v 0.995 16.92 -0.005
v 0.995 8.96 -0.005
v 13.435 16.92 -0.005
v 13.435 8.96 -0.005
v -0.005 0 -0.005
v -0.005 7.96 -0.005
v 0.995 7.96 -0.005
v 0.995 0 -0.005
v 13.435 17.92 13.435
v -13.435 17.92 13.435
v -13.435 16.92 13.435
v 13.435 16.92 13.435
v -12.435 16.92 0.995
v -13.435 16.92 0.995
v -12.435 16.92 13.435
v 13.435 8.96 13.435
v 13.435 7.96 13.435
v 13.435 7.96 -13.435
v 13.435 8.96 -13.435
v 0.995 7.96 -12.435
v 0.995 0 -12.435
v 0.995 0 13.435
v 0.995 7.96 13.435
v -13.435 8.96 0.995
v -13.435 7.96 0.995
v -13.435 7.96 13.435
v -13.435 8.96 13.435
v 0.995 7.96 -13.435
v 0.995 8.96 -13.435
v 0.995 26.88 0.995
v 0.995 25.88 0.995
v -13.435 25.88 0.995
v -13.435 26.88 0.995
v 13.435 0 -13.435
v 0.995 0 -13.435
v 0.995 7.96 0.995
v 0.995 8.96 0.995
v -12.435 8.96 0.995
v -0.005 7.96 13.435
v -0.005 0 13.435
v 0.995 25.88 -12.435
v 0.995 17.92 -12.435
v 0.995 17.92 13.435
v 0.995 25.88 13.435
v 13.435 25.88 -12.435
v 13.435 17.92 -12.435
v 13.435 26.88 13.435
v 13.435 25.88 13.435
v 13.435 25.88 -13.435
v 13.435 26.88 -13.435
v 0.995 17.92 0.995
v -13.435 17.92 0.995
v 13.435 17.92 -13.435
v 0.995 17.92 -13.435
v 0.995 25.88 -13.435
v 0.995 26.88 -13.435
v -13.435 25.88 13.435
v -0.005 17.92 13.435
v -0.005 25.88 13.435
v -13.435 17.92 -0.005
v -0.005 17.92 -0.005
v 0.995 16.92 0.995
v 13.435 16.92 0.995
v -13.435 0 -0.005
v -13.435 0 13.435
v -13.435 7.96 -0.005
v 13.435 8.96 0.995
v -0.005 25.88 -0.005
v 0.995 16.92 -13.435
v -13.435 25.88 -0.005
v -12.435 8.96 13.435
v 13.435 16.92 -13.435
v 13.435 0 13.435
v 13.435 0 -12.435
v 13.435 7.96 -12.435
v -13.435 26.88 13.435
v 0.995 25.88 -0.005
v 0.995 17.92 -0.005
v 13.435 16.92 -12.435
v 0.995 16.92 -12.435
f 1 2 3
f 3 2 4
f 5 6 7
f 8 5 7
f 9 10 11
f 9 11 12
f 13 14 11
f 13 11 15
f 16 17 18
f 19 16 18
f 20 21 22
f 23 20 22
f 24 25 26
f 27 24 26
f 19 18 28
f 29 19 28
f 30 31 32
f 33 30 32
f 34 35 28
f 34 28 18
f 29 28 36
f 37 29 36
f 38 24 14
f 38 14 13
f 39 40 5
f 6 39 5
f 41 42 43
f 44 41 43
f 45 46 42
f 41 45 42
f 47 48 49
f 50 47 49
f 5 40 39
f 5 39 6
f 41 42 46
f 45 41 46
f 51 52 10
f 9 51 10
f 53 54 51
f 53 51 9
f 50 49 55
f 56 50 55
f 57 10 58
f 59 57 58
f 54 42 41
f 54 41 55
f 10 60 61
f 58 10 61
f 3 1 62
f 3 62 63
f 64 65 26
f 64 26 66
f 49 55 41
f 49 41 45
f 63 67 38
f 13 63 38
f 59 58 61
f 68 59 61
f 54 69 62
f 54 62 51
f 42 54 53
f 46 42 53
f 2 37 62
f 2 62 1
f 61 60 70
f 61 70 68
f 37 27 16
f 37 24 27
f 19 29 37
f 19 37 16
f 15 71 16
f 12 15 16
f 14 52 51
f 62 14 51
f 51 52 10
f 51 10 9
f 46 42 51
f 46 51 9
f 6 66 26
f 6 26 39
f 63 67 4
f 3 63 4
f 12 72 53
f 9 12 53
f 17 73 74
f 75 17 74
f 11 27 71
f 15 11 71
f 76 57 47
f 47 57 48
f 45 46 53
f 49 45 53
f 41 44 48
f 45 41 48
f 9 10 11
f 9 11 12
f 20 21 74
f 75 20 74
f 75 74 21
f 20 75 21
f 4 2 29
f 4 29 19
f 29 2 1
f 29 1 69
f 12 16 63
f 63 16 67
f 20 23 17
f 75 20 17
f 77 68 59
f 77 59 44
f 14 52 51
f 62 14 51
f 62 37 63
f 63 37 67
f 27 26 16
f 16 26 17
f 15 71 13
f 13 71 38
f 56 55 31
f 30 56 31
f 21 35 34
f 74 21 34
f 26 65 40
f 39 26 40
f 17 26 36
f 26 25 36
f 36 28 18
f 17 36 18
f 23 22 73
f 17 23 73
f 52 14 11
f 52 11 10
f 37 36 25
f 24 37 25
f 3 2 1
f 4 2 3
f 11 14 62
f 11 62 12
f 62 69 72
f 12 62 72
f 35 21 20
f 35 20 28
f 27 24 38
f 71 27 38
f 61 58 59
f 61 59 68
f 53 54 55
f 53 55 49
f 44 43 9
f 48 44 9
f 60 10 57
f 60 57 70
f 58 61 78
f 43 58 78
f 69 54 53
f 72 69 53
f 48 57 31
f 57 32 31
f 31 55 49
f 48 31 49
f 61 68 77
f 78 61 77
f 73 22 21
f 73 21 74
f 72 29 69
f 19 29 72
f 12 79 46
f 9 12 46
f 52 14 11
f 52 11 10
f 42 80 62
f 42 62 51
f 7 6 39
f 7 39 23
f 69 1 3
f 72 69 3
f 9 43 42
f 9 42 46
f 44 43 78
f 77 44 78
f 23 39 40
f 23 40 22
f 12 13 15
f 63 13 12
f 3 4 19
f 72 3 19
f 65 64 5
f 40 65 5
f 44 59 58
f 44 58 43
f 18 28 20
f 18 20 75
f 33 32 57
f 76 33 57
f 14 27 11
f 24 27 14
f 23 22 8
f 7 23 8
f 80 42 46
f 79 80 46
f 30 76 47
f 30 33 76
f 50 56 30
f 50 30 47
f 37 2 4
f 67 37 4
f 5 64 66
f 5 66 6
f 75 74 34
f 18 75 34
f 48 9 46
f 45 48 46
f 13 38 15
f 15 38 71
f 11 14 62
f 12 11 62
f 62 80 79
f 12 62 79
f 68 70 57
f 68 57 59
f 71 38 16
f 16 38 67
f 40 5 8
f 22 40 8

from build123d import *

# Parameters (mm, degrees)
EXTRUDE_2_DEPTH               = 7.96
SKETCH_3_W                    = 13.430057686
SKETCH_3_H                    = 13.44
EXTRUDE_2_2_DEPTH             = 7.96
SKETCH_3_3_W                  = 12.44
SKETCH_3_3_H                  = 1.000057686
EXTRUDE_3_DEPTH               = 7.96
SKETCH_3_3_W_2                = 1
SKETCH_3_3_H_2                = 13.44
EXTRUDE_3_2_DEPTH             = 7.96
SKETCH_4_W                    = 12.44
SKETCH_4_H                    = 13.43
EXTRUDE_4_DEPTH               = 7.96
EXTRUDE_4_2_DEPTH             = 7.96
SKETCH_4_4_W                  = 12.44
SKETCH_4_4_H                  = 1
EXTRUDE_5_DEPTH               = 7.96
SKETCH_4_4_W_2                = 1
SKETCH_4_4_H_2                = 12.44
EXTRUDE_5_2_DEPTH             = 7.96
EXTRUDE_8_DEPTH               = 1
PATTERN_START                 = 0.995028843
PATTERN_LINEAR_10_OUTLINE_W   = 26.870057686
PATTERN_LINEAR_10_OUTLINE_H   = 1
PATTERN_LINEAR_10_DEPTH       = 12.44
PATTERN_START_2               = -13.434971157
PATTERN_LINEAR_10_2_OUTLINE_W = 12.44
PATTERN_LINEAR_10_2_OUTLINE_H = 1
PATTERN_LINEAR_10_2_DEPTH     = 14.43
PATTERN_LINEAR_10_3_OUTLINE_W = 26.870057686
PATTERN_LINEAR_10_3_OUTLINE_H = 1
PATTERN_LINEAR_10_3_DEPTH     = 12.44
PATTERN_START_3               = -12.434971157
PATTERN_LINEAR_10_4_OUTLINE_W = 12.44
PATTERN_LINEAR_10_4_OUTLINE_H = 1
PATTERN_LINEAR_10_4_DEPTH     = 13.43
PATTERN_LINEAR_8_COUNT        = 2
PATTERN_LINEAR_8_PITCH        = 17.92


# Read off the part's stored shape, not the designer's step: Линейный массив10
with BuildPart() as part:
    # Эскиз3 → Бобышка-Вытянуть2 (new body)
    with BuildSketch(Plane(origin=(0, 0, 0), x_dir=(1, 0, 0), z_dir=(0, 1, 0))):
        Polygon((13.435028843, 12.434971157), (0.995028843, 12.434971157), (0.995028843, 0.004971157), (0.995028843, -13.435028843), (13.435028843, -13.435028843), align=None)
    extrude(amount=EXTRUDE_2_DEPTH)


with BuildPart() as body_2:
    # Эскиз3 → Extrude 2 2 (new body)
    with BuildSketch(Plane(origin=(0, 0, 0), x_dir=(1, 0, 0), z_dir=(0, 1, 0))):
        with Locations((-6.72, -6.715028843)):
            Rectangle(SKETCH_3_W, SKETCH_3_H)
    extrude(amount=EXTRUDE_2_2_DEPTH)


with BuildPart() as body_3:
    # Эскиз3<3> → Бобышка-Вытянуть3 (new body)
    with BuildSketch(Plane(origin=(0, 0, 0), x_dir=(1, 0, 0), z_dir=(0, 1, 0))):
        with Locations((7.215028843, 12.935)):
            Rectangle(SKETCH_3_3_W, SKETCH_3_3_H)
    extrude(amount=EXTRUDE_3_DEPTH)


with BuildPart() as body_4:
    # Эскиз3<3> → Extrude 3 2 (new body)
    with BuildSketch(Plane(origin=(0, 0, 0), x_dir=(1, 0, 0), z_dir=(0, 1, 0))):
        with Locations((0.495028843, -6.715028843)):
            Rectangle(SKETCH_3_3_W_2, SKETCH_3_3_H_2)
    extrude(amount=EXTRUDE_3_2_DEPTH)


with BuildPart() as body_5:
    # Эскиз4 → Бобышка-Вытянуть4 (new body)
    with BuildSketch(Plane(origin=(0, 8.96, 0), x_dir=(1, 0, 0), z_dir=(0, 1, 0))):
        with Locations((7.215028843, 6.719971157)):
            Rectangle(SKETCH_4_W, SKETCH_4_H)
    extrude(amount=EXTRUDE_4_DEPTH)


with BuildPart() as body_6:
    # Эскиз4 → Extrude 4 2 (new body)
    with BuildSketch(Plane(origin=(0, 8.96, 0), x_dir=(1, 0, 0), z_dir=(0, 1, 0))):
        Polygon((1.143114309, -0.995028843), (0.995028843, -0.995028843), (-12.435028843, -0.995028843), (-12.435028843, -13.435028843), (0.995028843, -13.435028843), (13.435028843, -13.435028843), (13.435028843, -0.995028843), align=None)
    extrude(amount=EXTRUDE_4_2_DEPTH)


with BuildPart() as body_7:
    # Эскиз4<4> → Бобышка-Вытянуть5 (new body)
    with BuildSketch(Plane(origin=(0, 8.96, 0), x_dir=(1, 0, 0), z_dir=(0, 1, 0))):
        with Locations((7.215028843, -0.495028843)):
            Rectangle(SKETCH_4_4_W, SKETCH_4_4_H)
    extrude(amount=EXTRUDE_5_DEPTH)


with BuildPart() as body_8:
    # Эскиз4<4> → Extrude 5 2 (new body)
    with BuildSketch(Plane(origin=(0, 8.96, 0), x_dir=(1, 0, 0), z_dir=(0, 1, 0))):
        with Locations((-12.935028843, -7.215028843)):
            Rectangle(SKETCH_4_4_W_2, SKETCH_4_4_H_2)
    extrude(amount=EXTRUDE_5_2_DEPTH)


with BuildPart() as body_9:
    # Эскиз5 → Бобышка-Вытянуть8 (new body)
    with BuildSketch(Plane(origin=(0, 7.96, 0), x_dir=(1, 0, 0), z_dir=(0, 1, 0))):
        Polygon((-13.435028843, -13.435028843), (0.995028843, -13.435028843), (13.435028843, -13.435028843), (13.435028843, 13.434971157), (0.995028843, 13.434971157), (0.995028843, -0.995028843), (-13.435028843, -0.995028843), align=None)
    extrude(amount=EXTRUDE_8_DEPTH)


with BuildPart() as body_10:
    # Линейный массив10 outline → Линейный массив10 (new body)
    with BuildSketch(Plane.XY.offset(PATTERN_START)):
        with Locations((0, 17.42)):
            Rectangle(PATTERN_LINEAR_10_OUTLINE_W, PATTERN_LINEAR_10_OUTLINE_H)
    extrude(amount=PATTERN_LINEAR_10_DEPTH)

    # Pattern Linear 10 2 outline → Pattern Linear 10 2 (add)
    with BuildSketch(Plane.XY.offset(PATTERN_START_2)):
        with Locations((7.215028843, 17.42)):
            Rectangle(PATTERN_LINEAR_10_2_OUTLINE_W, PATTERN_LINEAR_10_2_OUTLINE_H)
    extrude(amount=PATTERN_LINEAR_10_2_DEPTH)


with BuildPart() as body_11:
    # Pattern Linear 10 3 outline → Pattern Linear 10 3 (new body)
    with BuildSketch(Plane.XY.offset(PATTERN_START)):
        with Locations((0, 17.42)):
            Rectangle(PATTERN_LINEAR_10_3_OUTLINE_W, PATTERN_LINEAR_10_3_OUTLINE_H)
    extrude(amount=PATTERN_LINEAR_10_3_DEPTH)

    # Pattern Linear 10 4 outline → Pattern Linear 10 4 (add)
    with BuildSketch(Plane.XY.offset(PATTERN_START_3)):
        with Locations((7.215028843, 17.42)):
            Rectangle(PATTERN_LINEAR_10_4_OUTLINE_W, PATTERN_LINEAR_10_4_OUTLINE_H)
    extrude(amount=PATTERN_LINEAR_10_4_DEPTH)


with BuildPart() as pattern_linear_8_1:
    # Линейный массив8: pattern copy
    add(body_3.part.moved(Location(Vector(0, 1, 0) * (1 * PATTERN_LINEAR_8_PITCH))))


with BuildPart() as pattern_linear_8_2:
    # Линейный массив8: pattern copy
    add(body_2.part.moved(Location(Vector(0, 1, 0) * (1 * PATTERN_LINEAR_8_PITCH))))


with BuildPart() as pattern_linear_8_3:
    # Линейный массив8: pattern copy
    add(body_9.part.moved(Location(Vector(0, 1, 0) * (1 * PATTERN_LINEAR_8_PITCH))))


with BuildPart() as pattern_linear_8_4:
    # Линейный массив8: pattern copy
    add(body_4.part.moved(Location(Vector(0, 1, 0) * (1 * PATTERN_LINEAR_8_PITCH))))


with BuildPart() as pattern_linear_8_5:
    # Линейный массив8: pattern copy
    add(part.part.moved(Location(Vector(0, 1, 0) * (1 * PATTERN_LINEAR_8_PITCH))))


solid = Compound([part.part, body_2.part, body_3.part, body_4.part, body_5.part, body_6.part, body_7.part, body_8.part, body_9.part, body_10.part, body_11.part, pattern_linear_8_1.part, pattern_linear_8_2.part, pattern_linear_8_3.part, pattern_linear_8_4.part, pattern_linear_8_5.part])
